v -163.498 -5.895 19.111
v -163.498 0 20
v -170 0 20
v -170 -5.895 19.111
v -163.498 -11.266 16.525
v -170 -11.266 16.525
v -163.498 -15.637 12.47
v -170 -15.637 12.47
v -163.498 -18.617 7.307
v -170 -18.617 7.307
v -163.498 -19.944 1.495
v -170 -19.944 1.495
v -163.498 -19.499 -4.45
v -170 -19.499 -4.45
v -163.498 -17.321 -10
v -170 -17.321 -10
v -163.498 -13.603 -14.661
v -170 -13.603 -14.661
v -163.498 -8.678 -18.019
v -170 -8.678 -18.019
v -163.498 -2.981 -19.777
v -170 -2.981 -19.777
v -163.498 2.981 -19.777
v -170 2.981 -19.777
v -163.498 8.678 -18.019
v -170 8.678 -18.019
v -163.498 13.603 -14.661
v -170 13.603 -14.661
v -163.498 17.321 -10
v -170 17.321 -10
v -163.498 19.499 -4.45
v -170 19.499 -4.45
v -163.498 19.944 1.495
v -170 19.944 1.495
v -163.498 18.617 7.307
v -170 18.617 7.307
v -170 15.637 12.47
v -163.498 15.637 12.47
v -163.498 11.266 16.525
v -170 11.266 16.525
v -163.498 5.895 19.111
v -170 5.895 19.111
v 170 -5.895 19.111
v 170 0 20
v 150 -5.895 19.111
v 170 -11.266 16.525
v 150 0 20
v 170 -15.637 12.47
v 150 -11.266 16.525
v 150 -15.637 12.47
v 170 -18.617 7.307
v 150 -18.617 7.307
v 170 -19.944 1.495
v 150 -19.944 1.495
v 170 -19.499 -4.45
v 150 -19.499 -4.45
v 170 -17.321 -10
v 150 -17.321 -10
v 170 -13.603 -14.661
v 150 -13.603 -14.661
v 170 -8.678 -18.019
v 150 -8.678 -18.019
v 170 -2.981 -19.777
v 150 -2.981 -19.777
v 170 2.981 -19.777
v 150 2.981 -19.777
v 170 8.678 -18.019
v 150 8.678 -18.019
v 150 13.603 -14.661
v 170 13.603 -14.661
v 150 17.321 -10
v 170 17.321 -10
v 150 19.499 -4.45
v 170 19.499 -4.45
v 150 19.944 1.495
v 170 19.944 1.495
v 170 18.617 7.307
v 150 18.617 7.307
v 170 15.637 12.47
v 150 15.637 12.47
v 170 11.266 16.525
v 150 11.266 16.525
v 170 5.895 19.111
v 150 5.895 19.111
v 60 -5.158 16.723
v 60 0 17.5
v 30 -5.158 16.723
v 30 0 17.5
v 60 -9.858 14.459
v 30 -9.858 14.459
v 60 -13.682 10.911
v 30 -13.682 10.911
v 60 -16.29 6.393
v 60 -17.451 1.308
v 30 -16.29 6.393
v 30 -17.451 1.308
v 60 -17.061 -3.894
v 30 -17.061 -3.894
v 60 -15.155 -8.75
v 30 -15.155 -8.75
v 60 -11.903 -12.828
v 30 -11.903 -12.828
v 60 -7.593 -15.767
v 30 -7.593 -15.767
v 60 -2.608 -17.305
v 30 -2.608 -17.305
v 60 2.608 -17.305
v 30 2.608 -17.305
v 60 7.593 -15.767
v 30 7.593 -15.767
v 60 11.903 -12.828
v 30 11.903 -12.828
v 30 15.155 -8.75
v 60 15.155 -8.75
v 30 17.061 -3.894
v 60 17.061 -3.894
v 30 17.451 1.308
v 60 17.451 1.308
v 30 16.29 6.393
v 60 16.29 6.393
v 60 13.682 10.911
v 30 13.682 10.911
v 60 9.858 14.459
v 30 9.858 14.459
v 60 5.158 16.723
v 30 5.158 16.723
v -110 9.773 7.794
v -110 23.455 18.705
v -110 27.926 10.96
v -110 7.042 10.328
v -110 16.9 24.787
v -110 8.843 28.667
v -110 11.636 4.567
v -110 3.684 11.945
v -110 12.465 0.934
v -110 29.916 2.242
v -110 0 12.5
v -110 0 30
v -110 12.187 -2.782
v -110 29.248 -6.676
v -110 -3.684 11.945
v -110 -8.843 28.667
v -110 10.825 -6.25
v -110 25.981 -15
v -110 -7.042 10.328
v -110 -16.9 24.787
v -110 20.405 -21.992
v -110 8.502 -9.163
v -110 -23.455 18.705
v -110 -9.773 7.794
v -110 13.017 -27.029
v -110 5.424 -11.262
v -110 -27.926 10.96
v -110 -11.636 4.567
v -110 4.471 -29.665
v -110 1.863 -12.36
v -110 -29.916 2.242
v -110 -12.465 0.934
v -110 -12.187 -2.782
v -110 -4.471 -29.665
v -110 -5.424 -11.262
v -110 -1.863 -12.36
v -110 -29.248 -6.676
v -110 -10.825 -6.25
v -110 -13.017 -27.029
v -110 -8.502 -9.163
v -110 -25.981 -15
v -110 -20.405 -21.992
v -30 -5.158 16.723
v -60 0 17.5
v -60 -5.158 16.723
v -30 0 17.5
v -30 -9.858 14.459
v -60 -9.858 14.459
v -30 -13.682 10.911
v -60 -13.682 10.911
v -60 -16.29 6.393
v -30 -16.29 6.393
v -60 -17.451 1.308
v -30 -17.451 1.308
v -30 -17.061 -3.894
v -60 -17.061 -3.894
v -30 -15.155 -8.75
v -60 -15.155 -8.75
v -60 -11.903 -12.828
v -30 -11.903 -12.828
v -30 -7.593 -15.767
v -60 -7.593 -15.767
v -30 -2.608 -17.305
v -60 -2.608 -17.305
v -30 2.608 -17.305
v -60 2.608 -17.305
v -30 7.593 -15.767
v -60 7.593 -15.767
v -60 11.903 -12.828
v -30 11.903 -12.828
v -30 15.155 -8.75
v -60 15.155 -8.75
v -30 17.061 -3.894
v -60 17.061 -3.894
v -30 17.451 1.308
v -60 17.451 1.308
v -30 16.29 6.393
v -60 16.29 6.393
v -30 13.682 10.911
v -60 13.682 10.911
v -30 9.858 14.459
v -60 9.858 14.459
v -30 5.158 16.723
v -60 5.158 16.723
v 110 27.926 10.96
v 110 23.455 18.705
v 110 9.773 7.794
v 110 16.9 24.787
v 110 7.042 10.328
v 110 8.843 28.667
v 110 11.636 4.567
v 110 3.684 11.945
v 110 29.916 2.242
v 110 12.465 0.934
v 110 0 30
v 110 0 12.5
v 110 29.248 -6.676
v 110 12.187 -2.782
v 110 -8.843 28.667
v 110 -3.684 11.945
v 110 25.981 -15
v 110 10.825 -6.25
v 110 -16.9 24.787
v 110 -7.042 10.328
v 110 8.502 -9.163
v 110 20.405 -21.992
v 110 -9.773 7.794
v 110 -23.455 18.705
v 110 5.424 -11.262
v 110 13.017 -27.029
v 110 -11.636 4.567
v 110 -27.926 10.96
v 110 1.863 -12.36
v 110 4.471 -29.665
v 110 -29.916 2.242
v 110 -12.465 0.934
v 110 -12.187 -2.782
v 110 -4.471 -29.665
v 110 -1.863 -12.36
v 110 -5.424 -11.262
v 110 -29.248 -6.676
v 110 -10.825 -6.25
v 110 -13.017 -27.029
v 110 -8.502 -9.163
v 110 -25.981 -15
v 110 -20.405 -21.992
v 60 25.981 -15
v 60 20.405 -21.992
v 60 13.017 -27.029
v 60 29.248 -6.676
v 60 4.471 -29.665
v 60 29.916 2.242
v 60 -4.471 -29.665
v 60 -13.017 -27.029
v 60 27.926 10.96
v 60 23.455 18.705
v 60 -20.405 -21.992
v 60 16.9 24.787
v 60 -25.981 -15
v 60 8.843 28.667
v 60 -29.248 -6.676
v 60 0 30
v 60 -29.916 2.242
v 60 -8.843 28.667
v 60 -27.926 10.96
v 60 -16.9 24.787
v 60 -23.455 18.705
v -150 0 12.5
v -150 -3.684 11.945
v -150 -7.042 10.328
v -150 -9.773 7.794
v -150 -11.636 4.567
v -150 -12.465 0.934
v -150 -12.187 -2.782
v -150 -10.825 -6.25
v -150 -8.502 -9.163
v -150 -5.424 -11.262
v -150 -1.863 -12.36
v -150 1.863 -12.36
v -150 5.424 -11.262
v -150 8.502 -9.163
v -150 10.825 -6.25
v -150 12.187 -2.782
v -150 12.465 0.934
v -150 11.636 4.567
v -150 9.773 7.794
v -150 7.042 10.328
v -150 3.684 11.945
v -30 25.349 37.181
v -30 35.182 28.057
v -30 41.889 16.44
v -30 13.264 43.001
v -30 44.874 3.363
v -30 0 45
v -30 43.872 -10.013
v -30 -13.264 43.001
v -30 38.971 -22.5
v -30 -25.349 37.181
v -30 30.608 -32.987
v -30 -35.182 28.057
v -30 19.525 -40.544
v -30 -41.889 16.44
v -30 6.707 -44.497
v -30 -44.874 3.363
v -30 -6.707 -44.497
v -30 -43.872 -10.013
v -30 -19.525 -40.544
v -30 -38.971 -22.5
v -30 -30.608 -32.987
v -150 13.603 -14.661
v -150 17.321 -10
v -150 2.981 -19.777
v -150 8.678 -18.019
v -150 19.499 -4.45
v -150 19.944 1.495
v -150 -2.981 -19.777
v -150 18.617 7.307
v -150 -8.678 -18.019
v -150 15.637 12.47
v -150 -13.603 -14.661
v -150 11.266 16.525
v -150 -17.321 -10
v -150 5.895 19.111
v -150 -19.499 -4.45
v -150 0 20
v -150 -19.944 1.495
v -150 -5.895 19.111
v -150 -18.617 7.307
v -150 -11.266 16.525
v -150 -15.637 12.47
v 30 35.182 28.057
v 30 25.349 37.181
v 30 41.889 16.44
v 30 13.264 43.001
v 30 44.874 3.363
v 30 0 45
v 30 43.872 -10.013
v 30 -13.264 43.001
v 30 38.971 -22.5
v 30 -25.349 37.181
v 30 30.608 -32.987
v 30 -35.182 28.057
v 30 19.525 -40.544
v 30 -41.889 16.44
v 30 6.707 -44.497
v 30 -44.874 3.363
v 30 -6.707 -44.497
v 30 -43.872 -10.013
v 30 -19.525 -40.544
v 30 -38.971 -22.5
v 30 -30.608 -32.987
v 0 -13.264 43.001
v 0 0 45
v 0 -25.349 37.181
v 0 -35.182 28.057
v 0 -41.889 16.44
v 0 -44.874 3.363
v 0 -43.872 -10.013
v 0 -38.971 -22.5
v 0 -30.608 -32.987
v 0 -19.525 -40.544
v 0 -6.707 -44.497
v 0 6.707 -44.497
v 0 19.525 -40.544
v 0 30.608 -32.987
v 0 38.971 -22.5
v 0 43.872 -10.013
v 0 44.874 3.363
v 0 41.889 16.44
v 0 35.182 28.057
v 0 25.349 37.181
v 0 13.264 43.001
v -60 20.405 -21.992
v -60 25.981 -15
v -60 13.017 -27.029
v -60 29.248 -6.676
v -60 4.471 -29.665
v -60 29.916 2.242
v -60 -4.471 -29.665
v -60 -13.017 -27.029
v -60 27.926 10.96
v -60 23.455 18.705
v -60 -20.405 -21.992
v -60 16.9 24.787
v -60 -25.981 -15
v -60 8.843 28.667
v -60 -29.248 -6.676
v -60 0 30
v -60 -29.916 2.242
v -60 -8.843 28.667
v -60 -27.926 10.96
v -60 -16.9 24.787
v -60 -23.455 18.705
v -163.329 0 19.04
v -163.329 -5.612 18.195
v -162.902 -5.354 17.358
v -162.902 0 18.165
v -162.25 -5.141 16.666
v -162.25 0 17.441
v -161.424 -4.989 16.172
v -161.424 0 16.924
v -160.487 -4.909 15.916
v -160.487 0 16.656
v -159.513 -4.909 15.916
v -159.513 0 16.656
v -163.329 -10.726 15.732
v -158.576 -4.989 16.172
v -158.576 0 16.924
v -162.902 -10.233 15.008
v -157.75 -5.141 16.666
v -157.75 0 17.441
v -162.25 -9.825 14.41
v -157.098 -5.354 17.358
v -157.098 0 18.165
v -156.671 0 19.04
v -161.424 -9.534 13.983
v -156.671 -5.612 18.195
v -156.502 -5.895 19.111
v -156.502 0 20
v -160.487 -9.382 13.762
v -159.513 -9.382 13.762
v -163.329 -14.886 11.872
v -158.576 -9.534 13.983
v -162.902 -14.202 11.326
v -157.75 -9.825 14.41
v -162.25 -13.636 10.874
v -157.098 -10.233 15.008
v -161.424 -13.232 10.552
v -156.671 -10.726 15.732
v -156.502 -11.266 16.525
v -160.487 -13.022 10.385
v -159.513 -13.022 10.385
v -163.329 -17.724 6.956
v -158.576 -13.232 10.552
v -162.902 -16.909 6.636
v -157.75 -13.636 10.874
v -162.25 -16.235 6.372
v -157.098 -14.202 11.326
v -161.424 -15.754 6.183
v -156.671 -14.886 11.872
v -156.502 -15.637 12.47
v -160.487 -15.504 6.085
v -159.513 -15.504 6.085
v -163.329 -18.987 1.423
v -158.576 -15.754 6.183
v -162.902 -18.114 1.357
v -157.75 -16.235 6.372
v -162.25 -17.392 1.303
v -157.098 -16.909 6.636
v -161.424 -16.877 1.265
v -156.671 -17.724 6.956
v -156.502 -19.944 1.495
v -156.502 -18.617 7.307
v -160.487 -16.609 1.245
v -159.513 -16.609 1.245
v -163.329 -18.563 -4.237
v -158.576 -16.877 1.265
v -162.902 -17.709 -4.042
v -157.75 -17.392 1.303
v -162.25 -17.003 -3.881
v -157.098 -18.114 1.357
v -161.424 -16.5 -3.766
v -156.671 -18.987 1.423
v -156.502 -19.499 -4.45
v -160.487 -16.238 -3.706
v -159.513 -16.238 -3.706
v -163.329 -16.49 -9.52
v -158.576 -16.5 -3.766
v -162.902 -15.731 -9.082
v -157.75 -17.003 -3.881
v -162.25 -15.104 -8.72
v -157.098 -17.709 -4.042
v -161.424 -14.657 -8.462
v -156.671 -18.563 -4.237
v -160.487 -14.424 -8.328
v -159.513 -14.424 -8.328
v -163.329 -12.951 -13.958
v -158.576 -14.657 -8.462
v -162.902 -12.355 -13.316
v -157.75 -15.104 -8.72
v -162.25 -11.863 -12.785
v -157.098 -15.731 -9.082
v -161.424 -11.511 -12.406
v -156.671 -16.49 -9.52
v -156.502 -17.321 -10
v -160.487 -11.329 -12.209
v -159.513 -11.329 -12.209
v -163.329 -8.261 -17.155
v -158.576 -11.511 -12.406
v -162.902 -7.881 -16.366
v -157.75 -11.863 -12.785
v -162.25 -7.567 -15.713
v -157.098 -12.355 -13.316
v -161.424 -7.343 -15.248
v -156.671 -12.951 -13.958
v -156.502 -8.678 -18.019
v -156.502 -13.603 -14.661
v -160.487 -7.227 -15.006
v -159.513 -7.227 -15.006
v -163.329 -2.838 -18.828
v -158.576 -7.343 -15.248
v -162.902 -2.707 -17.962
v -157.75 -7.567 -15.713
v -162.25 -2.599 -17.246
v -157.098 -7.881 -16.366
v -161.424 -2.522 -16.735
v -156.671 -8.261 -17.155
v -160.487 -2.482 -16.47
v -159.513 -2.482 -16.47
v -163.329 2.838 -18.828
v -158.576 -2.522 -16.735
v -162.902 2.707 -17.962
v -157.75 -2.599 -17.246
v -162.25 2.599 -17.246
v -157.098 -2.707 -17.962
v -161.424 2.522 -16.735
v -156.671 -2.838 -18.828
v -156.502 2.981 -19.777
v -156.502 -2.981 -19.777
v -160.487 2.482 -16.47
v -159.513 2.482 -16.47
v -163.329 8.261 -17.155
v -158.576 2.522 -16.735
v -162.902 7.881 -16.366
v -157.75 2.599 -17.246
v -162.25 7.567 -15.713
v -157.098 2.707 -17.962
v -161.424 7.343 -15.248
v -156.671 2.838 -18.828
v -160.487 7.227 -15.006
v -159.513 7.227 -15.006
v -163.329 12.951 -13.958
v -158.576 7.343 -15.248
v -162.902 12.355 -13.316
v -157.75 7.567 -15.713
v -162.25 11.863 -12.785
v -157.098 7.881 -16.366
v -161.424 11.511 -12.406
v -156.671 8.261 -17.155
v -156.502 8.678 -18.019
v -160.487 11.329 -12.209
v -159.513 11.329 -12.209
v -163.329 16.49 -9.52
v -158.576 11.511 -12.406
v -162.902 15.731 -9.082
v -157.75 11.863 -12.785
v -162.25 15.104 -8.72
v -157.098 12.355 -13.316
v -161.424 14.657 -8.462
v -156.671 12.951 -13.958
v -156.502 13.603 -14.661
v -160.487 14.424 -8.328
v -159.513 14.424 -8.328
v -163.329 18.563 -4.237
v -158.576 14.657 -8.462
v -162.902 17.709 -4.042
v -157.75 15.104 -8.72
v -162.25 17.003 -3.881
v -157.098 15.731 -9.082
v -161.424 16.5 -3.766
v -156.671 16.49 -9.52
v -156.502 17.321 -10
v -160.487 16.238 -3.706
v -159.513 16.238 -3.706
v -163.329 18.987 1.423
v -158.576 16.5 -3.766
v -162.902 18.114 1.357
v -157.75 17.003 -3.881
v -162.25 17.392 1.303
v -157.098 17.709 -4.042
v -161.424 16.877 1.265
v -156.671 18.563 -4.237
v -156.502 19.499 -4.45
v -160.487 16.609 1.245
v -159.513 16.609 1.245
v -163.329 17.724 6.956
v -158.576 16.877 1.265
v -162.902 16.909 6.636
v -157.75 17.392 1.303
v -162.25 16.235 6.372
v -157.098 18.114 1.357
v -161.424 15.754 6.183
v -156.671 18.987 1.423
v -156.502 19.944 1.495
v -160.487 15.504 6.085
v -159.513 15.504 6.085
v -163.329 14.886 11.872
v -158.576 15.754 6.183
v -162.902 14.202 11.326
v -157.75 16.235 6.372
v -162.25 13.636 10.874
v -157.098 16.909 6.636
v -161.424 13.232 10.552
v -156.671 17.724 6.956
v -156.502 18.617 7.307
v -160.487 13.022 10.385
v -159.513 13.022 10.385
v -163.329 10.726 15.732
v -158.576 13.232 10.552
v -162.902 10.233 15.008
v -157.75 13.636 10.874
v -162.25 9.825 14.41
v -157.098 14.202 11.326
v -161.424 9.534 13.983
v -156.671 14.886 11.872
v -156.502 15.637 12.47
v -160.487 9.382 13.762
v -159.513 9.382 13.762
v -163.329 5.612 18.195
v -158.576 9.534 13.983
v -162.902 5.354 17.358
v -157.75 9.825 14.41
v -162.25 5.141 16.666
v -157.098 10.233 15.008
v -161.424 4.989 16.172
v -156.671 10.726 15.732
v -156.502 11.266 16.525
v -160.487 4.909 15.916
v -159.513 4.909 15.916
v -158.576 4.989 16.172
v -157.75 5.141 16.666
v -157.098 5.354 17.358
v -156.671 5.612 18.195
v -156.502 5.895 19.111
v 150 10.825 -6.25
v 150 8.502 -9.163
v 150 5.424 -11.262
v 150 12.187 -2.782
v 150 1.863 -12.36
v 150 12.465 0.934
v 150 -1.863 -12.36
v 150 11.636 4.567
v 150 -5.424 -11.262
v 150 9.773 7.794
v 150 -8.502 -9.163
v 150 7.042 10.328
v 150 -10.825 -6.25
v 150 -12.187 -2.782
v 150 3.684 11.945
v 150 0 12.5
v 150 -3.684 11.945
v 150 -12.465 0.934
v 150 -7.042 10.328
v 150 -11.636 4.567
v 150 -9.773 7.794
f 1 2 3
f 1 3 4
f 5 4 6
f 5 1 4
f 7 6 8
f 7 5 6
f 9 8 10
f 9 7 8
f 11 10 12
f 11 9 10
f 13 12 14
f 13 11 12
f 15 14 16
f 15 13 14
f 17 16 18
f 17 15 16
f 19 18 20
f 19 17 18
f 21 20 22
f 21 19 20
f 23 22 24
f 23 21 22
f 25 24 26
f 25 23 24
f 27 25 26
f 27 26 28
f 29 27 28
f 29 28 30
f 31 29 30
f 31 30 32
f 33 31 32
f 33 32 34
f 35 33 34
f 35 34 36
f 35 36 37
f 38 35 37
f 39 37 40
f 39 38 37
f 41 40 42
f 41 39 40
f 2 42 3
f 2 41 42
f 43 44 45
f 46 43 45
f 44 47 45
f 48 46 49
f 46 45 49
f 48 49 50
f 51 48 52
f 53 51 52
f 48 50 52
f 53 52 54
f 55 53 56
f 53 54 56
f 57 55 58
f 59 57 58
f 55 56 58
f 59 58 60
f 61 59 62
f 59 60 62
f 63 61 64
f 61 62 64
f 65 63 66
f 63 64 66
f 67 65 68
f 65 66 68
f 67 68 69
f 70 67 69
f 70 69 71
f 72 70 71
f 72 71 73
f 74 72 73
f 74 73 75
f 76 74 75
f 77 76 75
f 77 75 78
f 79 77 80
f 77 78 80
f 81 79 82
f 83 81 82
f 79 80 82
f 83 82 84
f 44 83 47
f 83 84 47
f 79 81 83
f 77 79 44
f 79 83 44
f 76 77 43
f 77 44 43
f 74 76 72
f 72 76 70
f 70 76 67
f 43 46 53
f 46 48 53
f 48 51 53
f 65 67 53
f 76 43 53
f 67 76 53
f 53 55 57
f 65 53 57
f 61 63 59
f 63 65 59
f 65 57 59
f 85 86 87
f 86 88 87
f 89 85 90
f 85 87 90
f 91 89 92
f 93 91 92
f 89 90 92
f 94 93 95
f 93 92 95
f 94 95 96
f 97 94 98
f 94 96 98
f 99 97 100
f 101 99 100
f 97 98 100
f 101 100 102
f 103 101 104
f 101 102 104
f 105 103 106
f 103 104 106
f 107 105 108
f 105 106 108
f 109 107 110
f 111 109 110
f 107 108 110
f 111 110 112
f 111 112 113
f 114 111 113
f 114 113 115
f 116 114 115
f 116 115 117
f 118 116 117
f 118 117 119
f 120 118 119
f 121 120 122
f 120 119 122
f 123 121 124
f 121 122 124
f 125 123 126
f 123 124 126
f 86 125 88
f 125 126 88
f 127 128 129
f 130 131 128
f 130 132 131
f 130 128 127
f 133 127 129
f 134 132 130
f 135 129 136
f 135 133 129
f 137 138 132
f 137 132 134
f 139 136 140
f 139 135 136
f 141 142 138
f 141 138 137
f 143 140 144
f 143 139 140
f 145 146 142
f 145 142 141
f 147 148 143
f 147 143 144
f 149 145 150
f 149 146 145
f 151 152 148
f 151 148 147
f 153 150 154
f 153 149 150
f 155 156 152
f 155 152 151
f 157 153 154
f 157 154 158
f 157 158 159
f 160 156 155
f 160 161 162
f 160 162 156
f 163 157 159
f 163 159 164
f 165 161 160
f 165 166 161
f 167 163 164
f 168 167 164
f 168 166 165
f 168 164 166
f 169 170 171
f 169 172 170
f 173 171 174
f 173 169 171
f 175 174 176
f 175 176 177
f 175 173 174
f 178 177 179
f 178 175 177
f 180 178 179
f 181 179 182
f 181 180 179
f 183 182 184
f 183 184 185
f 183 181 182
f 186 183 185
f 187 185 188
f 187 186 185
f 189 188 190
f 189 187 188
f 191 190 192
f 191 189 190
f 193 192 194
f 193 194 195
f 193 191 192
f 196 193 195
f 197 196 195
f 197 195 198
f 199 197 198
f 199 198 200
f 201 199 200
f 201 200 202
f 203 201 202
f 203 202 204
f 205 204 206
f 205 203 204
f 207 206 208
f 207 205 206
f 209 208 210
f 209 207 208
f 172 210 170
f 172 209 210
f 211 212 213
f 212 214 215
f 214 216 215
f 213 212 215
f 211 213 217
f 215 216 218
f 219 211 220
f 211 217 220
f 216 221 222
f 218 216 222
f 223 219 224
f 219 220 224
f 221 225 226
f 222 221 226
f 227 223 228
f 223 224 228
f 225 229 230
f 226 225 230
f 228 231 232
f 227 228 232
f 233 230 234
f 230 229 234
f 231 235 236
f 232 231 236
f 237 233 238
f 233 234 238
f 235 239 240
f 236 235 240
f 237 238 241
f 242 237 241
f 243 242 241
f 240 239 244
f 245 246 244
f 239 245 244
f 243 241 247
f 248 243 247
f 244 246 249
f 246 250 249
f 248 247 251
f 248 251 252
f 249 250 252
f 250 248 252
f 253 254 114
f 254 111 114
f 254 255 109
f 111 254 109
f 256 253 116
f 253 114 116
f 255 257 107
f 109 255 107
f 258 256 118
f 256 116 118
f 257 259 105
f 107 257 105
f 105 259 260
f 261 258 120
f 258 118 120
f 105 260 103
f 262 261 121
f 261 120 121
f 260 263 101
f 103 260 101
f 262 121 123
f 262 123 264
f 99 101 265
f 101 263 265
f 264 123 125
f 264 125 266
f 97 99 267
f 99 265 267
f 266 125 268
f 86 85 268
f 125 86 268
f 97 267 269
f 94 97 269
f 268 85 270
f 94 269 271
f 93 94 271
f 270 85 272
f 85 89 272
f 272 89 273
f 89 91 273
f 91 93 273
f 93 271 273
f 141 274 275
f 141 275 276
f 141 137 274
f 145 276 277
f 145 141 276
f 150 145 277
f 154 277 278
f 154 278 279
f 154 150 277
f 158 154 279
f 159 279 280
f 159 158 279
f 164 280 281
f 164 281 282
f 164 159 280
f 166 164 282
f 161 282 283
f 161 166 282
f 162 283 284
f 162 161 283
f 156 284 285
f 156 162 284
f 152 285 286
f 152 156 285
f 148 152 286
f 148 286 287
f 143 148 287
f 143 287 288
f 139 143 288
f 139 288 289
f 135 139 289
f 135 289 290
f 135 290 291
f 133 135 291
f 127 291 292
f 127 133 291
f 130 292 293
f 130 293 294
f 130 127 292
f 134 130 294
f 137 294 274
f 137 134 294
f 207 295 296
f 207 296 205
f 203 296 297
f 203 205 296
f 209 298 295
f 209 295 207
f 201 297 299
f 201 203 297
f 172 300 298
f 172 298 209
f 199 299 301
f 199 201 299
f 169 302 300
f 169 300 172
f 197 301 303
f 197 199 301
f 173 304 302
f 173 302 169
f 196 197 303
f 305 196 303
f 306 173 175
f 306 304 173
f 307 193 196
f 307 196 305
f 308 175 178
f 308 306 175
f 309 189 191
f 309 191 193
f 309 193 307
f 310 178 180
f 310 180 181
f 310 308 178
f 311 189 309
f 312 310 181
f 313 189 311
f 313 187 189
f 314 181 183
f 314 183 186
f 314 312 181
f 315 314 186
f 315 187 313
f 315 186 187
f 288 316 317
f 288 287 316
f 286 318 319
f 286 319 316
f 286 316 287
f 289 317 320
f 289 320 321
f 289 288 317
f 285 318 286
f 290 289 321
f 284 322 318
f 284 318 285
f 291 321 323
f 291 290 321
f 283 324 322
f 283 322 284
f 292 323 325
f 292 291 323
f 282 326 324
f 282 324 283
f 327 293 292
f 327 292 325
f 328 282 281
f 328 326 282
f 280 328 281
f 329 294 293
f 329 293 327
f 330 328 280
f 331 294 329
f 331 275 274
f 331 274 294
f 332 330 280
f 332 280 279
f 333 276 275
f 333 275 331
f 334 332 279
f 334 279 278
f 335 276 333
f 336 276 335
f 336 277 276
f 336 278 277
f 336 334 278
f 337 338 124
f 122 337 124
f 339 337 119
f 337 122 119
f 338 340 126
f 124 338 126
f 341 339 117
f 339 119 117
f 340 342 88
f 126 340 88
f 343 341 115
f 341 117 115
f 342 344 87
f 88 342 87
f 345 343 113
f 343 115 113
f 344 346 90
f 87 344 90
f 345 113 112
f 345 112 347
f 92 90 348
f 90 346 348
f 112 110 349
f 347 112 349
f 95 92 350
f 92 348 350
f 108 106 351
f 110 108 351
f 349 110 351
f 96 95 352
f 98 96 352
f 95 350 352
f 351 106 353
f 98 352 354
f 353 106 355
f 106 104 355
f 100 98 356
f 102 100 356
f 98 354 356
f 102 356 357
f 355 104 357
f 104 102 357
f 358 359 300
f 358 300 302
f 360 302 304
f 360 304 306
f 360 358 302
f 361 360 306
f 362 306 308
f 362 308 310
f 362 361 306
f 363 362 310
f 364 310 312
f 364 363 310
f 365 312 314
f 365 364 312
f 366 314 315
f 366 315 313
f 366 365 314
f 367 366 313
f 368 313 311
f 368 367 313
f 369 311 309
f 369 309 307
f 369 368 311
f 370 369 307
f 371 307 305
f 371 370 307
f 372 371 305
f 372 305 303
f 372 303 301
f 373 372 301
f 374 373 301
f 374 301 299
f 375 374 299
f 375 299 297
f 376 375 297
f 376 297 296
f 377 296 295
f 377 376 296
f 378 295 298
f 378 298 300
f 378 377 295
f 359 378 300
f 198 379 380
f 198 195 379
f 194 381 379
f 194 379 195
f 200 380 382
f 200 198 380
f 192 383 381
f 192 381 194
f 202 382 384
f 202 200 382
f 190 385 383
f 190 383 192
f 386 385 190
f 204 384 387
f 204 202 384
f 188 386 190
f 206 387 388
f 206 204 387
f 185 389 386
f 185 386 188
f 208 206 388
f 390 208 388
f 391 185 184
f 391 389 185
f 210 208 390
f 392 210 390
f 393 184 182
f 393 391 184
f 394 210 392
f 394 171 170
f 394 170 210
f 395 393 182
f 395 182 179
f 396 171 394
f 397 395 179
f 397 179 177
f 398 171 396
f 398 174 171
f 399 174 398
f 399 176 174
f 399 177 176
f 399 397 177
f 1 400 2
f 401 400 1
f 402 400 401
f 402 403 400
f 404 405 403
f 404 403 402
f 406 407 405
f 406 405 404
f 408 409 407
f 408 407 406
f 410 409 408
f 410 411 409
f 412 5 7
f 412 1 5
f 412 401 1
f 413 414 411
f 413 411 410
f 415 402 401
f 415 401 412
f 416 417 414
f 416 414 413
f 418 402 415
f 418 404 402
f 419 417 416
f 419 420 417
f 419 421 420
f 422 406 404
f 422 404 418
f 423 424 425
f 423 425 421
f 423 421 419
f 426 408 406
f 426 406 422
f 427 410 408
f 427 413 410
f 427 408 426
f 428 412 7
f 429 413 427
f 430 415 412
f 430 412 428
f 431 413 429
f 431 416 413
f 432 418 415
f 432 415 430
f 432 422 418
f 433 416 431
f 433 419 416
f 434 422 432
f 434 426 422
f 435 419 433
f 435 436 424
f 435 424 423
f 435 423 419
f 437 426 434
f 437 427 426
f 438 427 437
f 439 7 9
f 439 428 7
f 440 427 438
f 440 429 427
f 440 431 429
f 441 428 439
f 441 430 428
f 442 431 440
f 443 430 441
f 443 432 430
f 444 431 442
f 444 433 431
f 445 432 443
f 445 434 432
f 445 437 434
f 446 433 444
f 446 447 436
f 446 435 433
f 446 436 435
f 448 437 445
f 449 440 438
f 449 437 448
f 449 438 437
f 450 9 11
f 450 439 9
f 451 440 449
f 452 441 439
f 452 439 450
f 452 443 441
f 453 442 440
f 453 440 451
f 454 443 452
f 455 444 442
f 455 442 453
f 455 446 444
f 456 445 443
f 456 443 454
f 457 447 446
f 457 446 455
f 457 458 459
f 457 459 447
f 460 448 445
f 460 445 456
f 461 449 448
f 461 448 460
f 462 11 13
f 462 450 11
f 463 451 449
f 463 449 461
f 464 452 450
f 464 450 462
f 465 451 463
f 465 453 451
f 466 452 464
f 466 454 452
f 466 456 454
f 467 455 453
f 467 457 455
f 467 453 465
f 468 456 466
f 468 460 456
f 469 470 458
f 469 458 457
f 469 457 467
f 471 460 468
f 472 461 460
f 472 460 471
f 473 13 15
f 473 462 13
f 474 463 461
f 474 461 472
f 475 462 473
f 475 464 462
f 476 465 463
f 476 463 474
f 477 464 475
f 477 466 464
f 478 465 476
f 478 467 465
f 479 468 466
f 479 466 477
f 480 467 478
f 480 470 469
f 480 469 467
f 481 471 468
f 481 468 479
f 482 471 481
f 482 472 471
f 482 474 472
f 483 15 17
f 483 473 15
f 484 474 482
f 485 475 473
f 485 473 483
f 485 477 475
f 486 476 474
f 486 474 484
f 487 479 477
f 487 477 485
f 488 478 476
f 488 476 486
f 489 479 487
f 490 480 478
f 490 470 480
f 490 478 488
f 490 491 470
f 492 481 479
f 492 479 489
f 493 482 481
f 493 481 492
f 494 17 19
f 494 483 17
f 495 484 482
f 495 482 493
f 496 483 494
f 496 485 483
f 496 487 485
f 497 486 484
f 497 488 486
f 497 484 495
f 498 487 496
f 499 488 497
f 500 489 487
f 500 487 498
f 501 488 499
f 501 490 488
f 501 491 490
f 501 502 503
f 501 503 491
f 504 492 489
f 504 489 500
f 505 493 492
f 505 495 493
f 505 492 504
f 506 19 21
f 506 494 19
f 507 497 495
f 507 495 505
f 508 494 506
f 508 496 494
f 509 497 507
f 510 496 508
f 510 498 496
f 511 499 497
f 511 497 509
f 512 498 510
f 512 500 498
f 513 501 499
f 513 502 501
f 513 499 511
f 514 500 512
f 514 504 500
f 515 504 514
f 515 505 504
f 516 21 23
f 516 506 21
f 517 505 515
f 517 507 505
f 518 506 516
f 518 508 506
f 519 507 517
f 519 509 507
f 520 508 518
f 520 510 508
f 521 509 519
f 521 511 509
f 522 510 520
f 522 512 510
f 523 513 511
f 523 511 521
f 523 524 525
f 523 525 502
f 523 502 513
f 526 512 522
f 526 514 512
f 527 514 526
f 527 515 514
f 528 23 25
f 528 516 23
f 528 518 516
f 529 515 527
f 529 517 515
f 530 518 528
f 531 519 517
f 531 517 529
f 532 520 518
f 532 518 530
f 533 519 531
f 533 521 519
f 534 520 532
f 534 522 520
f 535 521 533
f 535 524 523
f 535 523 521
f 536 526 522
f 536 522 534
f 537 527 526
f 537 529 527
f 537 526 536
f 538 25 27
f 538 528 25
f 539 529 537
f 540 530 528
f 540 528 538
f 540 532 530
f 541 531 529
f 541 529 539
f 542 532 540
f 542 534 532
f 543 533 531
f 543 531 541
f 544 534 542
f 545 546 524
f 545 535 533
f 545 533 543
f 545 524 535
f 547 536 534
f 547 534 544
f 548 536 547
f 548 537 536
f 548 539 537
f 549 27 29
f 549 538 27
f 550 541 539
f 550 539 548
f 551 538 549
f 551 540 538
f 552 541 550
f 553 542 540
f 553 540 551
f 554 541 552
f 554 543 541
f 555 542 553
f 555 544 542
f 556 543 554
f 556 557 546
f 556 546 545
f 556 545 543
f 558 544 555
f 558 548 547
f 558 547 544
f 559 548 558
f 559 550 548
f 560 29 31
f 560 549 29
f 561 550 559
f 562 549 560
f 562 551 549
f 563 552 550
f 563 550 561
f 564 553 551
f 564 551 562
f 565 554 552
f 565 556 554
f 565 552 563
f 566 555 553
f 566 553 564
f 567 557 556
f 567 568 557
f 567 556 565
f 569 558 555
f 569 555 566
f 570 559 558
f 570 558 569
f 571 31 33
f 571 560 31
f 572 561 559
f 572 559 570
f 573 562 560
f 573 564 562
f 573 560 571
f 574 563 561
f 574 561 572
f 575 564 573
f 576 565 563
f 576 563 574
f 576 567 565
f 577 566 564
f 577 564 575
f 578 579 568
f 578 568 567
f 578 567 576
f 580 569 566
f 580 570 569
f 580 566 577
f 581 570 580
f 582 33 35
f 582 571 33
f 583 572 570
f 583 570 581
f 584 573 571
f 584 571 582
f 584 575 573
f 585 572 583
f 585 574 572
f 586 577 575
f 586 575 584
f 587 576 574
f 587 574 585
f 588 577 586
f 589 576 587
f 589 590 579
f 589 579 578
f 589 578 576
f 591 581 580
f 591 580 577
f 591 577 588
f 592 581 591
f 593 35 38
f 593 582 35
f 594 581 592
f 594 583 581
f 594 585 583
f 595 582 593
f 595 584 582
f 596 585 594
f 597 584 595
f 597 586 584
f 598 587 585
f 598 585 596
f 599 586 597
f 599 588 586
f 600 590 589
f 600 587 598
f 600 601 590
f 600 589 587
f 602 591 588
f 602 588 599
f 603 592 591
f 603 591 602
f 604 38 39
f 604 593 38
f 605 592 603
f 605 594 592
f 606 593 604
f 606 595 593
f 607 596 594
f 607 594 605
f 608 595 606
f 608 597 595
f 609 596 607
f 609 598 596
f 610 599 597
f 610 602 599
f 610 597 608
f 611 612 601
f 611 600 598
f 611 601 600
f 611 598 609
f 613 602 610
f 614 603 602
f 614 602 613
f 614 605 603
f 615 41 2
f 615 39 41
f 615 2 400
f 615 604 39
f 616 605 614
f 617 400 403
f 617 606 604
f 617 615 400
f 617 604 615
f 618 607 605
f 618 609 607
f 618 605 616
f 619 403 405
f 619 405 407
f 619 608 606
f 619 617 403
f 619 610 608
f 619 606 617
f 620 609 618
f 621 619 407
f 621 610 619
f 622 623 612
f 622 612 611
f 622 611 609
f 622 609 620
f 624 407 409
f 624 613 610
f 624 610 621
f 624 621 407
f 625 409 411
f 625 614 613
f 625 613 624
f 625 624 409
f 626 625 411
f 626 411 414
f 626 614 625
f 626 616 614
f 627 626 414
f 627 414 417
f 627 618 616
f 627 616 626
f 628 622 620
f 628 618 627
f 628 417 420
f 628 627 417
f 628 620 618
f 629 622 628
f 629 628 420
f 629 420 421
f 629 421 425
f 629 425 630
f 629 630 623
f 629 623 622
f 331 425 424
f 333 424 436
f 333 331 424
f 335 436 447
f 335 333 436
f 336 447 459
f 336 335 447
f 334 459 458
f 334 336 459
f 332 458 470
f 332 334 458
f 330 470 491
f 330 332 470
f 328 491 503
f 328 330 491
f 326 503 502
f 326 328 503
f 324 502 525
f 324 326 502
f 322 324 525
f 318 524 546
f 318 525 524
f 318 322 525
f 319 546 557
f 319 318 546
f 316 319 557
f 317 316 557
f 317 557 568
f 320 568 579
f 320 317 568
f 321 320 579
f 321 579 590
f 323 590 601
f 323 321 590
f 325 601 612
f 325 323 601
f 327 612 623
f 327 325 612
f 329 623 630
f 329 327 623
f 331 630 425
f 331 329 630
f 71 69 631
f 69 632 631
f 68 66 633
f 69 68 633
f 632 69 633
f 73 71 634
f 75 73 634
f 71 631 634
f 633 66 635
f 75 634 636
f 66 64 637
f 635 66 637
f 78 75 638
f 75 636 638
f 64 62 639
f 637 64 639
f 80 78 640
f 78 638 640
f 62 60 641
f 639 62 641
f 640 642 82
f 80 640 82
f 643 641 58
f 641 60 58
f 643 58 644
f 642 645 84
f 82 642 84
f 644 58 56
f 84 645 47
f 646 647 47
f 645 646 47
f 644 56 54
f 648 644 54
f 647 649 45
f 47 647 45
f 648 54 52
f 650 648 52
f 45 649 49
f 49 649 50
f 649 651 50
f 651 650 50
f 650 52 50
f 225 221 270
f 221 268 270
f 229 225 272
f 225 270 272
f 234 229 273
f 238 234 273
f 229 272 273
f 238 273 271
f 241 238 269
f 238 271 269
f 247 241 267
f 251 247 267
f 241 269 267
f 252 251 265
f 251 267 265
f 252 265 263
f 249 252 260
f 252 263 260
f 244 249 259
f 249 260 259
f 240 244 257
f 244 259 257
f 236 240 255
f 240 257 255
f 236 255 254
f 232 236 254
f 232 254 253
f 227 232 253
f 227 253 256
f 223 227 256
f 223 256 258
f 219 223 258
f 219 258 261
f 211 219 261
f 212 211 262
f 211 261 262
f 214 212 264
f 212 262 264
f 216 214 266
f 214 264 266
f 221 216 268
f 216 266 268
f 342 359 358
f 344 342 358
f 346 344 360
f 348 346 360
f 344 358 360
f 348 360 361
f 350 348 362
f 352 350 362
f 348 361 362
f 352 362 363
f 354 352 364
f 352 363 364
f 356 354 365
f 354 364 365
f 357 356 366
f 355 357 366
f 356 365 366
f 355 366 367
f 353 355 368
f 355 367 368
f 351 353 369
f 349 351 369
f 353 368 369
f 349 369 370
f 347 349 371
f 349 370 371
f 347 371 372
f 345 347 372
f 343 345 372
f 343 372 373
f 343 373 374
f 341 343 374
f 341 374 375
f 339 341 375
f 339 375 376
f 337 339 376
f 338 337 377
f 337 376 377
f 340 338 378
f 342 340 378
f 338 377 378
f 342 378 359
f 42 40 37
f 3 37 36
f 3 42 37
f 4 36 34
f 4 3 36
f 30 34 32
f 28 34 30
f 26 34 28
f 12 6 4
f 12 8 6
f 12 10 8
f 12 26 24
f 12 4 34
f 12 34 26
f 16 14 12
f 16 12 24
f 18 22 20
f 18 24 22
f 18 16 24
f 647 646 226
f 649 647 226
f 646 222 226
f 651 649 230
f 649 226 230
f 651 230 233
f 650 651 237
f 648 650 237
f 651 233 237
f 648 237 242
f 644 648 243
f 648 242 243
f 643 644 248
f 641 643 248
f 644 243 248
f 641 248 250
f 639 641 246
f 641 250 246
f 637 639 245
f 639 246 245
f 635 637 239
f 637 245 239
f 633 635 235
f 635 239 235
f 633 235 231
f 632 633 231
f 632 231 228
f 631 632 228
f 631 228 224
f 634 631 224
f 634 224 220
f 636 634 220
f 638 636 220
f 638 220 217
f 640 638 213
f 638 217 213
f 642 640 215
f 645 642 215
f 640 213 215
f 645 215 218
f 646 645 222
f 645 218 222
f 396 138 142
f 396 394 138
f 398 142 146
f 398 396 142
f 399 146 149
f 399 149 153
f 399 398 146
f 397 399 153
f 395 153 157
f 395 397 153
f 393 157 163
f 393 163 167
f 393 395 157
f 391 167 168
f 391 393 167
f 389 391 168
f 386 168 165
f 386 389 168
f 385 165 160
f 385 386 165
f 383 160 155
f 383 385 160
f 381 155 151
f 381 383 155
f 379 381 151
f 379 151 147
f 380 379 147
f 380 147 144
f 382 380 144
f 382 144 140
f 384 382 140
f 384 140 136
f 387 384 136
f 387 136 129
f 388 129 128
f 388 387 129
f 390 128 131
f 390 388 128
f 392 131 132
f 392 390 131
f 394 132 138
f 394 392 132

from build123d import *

# Parameters (mm, degrees)
SKETCH2_R = 3.5


with BuildPart() as part:
    # Sketch1 → Revolve1 (revolve)
    with BuildSketch(Plane.XY, mode=Mode.PRIVATE) as revolve1_sk:
        Polygon((-170, 0), (-170, 20), (-150, 20), (-150, 12.5), (-110, 12.5), (-110, 30), (-60, 30), (-60, 17.5), (-30, 17.5), (-30, 45), (0, 45), (0, 0), align=None)
    revolve1 = revolve(revolve1_sk.sketch.rotate(Axis((-99.144385027, 0, 0), (1, 0, 0)), 90), axis=Axis((-99.144385027, 0, 0), (1, 0, 0)))

    # Sketch2 → Cut-Revolve1 (revolve, cut)
    with BuildSketch(Plane.XY, mode=Mode.PRIVATE) as cut_revolve1_sk:
        with Locations((-160, 20.12160323)):
            Circle(SKETCH2_R)
    revolve(cut_revolve1_sk.sketch.rotate(Axis((-170, 0, 0), (1, 0, 0)), 90), axis=Axis((-170, 0, 0), (1, 0, 0)), mode=Mode.SUBTRACT)

    # Mirror1: Revolve1 across plane
    add(revolve1.mirror(Plane(origin=(0, 0, 0), x_dir=(0, 0, 1), z_dir=(1, 0, 0))))


solid = part.part
